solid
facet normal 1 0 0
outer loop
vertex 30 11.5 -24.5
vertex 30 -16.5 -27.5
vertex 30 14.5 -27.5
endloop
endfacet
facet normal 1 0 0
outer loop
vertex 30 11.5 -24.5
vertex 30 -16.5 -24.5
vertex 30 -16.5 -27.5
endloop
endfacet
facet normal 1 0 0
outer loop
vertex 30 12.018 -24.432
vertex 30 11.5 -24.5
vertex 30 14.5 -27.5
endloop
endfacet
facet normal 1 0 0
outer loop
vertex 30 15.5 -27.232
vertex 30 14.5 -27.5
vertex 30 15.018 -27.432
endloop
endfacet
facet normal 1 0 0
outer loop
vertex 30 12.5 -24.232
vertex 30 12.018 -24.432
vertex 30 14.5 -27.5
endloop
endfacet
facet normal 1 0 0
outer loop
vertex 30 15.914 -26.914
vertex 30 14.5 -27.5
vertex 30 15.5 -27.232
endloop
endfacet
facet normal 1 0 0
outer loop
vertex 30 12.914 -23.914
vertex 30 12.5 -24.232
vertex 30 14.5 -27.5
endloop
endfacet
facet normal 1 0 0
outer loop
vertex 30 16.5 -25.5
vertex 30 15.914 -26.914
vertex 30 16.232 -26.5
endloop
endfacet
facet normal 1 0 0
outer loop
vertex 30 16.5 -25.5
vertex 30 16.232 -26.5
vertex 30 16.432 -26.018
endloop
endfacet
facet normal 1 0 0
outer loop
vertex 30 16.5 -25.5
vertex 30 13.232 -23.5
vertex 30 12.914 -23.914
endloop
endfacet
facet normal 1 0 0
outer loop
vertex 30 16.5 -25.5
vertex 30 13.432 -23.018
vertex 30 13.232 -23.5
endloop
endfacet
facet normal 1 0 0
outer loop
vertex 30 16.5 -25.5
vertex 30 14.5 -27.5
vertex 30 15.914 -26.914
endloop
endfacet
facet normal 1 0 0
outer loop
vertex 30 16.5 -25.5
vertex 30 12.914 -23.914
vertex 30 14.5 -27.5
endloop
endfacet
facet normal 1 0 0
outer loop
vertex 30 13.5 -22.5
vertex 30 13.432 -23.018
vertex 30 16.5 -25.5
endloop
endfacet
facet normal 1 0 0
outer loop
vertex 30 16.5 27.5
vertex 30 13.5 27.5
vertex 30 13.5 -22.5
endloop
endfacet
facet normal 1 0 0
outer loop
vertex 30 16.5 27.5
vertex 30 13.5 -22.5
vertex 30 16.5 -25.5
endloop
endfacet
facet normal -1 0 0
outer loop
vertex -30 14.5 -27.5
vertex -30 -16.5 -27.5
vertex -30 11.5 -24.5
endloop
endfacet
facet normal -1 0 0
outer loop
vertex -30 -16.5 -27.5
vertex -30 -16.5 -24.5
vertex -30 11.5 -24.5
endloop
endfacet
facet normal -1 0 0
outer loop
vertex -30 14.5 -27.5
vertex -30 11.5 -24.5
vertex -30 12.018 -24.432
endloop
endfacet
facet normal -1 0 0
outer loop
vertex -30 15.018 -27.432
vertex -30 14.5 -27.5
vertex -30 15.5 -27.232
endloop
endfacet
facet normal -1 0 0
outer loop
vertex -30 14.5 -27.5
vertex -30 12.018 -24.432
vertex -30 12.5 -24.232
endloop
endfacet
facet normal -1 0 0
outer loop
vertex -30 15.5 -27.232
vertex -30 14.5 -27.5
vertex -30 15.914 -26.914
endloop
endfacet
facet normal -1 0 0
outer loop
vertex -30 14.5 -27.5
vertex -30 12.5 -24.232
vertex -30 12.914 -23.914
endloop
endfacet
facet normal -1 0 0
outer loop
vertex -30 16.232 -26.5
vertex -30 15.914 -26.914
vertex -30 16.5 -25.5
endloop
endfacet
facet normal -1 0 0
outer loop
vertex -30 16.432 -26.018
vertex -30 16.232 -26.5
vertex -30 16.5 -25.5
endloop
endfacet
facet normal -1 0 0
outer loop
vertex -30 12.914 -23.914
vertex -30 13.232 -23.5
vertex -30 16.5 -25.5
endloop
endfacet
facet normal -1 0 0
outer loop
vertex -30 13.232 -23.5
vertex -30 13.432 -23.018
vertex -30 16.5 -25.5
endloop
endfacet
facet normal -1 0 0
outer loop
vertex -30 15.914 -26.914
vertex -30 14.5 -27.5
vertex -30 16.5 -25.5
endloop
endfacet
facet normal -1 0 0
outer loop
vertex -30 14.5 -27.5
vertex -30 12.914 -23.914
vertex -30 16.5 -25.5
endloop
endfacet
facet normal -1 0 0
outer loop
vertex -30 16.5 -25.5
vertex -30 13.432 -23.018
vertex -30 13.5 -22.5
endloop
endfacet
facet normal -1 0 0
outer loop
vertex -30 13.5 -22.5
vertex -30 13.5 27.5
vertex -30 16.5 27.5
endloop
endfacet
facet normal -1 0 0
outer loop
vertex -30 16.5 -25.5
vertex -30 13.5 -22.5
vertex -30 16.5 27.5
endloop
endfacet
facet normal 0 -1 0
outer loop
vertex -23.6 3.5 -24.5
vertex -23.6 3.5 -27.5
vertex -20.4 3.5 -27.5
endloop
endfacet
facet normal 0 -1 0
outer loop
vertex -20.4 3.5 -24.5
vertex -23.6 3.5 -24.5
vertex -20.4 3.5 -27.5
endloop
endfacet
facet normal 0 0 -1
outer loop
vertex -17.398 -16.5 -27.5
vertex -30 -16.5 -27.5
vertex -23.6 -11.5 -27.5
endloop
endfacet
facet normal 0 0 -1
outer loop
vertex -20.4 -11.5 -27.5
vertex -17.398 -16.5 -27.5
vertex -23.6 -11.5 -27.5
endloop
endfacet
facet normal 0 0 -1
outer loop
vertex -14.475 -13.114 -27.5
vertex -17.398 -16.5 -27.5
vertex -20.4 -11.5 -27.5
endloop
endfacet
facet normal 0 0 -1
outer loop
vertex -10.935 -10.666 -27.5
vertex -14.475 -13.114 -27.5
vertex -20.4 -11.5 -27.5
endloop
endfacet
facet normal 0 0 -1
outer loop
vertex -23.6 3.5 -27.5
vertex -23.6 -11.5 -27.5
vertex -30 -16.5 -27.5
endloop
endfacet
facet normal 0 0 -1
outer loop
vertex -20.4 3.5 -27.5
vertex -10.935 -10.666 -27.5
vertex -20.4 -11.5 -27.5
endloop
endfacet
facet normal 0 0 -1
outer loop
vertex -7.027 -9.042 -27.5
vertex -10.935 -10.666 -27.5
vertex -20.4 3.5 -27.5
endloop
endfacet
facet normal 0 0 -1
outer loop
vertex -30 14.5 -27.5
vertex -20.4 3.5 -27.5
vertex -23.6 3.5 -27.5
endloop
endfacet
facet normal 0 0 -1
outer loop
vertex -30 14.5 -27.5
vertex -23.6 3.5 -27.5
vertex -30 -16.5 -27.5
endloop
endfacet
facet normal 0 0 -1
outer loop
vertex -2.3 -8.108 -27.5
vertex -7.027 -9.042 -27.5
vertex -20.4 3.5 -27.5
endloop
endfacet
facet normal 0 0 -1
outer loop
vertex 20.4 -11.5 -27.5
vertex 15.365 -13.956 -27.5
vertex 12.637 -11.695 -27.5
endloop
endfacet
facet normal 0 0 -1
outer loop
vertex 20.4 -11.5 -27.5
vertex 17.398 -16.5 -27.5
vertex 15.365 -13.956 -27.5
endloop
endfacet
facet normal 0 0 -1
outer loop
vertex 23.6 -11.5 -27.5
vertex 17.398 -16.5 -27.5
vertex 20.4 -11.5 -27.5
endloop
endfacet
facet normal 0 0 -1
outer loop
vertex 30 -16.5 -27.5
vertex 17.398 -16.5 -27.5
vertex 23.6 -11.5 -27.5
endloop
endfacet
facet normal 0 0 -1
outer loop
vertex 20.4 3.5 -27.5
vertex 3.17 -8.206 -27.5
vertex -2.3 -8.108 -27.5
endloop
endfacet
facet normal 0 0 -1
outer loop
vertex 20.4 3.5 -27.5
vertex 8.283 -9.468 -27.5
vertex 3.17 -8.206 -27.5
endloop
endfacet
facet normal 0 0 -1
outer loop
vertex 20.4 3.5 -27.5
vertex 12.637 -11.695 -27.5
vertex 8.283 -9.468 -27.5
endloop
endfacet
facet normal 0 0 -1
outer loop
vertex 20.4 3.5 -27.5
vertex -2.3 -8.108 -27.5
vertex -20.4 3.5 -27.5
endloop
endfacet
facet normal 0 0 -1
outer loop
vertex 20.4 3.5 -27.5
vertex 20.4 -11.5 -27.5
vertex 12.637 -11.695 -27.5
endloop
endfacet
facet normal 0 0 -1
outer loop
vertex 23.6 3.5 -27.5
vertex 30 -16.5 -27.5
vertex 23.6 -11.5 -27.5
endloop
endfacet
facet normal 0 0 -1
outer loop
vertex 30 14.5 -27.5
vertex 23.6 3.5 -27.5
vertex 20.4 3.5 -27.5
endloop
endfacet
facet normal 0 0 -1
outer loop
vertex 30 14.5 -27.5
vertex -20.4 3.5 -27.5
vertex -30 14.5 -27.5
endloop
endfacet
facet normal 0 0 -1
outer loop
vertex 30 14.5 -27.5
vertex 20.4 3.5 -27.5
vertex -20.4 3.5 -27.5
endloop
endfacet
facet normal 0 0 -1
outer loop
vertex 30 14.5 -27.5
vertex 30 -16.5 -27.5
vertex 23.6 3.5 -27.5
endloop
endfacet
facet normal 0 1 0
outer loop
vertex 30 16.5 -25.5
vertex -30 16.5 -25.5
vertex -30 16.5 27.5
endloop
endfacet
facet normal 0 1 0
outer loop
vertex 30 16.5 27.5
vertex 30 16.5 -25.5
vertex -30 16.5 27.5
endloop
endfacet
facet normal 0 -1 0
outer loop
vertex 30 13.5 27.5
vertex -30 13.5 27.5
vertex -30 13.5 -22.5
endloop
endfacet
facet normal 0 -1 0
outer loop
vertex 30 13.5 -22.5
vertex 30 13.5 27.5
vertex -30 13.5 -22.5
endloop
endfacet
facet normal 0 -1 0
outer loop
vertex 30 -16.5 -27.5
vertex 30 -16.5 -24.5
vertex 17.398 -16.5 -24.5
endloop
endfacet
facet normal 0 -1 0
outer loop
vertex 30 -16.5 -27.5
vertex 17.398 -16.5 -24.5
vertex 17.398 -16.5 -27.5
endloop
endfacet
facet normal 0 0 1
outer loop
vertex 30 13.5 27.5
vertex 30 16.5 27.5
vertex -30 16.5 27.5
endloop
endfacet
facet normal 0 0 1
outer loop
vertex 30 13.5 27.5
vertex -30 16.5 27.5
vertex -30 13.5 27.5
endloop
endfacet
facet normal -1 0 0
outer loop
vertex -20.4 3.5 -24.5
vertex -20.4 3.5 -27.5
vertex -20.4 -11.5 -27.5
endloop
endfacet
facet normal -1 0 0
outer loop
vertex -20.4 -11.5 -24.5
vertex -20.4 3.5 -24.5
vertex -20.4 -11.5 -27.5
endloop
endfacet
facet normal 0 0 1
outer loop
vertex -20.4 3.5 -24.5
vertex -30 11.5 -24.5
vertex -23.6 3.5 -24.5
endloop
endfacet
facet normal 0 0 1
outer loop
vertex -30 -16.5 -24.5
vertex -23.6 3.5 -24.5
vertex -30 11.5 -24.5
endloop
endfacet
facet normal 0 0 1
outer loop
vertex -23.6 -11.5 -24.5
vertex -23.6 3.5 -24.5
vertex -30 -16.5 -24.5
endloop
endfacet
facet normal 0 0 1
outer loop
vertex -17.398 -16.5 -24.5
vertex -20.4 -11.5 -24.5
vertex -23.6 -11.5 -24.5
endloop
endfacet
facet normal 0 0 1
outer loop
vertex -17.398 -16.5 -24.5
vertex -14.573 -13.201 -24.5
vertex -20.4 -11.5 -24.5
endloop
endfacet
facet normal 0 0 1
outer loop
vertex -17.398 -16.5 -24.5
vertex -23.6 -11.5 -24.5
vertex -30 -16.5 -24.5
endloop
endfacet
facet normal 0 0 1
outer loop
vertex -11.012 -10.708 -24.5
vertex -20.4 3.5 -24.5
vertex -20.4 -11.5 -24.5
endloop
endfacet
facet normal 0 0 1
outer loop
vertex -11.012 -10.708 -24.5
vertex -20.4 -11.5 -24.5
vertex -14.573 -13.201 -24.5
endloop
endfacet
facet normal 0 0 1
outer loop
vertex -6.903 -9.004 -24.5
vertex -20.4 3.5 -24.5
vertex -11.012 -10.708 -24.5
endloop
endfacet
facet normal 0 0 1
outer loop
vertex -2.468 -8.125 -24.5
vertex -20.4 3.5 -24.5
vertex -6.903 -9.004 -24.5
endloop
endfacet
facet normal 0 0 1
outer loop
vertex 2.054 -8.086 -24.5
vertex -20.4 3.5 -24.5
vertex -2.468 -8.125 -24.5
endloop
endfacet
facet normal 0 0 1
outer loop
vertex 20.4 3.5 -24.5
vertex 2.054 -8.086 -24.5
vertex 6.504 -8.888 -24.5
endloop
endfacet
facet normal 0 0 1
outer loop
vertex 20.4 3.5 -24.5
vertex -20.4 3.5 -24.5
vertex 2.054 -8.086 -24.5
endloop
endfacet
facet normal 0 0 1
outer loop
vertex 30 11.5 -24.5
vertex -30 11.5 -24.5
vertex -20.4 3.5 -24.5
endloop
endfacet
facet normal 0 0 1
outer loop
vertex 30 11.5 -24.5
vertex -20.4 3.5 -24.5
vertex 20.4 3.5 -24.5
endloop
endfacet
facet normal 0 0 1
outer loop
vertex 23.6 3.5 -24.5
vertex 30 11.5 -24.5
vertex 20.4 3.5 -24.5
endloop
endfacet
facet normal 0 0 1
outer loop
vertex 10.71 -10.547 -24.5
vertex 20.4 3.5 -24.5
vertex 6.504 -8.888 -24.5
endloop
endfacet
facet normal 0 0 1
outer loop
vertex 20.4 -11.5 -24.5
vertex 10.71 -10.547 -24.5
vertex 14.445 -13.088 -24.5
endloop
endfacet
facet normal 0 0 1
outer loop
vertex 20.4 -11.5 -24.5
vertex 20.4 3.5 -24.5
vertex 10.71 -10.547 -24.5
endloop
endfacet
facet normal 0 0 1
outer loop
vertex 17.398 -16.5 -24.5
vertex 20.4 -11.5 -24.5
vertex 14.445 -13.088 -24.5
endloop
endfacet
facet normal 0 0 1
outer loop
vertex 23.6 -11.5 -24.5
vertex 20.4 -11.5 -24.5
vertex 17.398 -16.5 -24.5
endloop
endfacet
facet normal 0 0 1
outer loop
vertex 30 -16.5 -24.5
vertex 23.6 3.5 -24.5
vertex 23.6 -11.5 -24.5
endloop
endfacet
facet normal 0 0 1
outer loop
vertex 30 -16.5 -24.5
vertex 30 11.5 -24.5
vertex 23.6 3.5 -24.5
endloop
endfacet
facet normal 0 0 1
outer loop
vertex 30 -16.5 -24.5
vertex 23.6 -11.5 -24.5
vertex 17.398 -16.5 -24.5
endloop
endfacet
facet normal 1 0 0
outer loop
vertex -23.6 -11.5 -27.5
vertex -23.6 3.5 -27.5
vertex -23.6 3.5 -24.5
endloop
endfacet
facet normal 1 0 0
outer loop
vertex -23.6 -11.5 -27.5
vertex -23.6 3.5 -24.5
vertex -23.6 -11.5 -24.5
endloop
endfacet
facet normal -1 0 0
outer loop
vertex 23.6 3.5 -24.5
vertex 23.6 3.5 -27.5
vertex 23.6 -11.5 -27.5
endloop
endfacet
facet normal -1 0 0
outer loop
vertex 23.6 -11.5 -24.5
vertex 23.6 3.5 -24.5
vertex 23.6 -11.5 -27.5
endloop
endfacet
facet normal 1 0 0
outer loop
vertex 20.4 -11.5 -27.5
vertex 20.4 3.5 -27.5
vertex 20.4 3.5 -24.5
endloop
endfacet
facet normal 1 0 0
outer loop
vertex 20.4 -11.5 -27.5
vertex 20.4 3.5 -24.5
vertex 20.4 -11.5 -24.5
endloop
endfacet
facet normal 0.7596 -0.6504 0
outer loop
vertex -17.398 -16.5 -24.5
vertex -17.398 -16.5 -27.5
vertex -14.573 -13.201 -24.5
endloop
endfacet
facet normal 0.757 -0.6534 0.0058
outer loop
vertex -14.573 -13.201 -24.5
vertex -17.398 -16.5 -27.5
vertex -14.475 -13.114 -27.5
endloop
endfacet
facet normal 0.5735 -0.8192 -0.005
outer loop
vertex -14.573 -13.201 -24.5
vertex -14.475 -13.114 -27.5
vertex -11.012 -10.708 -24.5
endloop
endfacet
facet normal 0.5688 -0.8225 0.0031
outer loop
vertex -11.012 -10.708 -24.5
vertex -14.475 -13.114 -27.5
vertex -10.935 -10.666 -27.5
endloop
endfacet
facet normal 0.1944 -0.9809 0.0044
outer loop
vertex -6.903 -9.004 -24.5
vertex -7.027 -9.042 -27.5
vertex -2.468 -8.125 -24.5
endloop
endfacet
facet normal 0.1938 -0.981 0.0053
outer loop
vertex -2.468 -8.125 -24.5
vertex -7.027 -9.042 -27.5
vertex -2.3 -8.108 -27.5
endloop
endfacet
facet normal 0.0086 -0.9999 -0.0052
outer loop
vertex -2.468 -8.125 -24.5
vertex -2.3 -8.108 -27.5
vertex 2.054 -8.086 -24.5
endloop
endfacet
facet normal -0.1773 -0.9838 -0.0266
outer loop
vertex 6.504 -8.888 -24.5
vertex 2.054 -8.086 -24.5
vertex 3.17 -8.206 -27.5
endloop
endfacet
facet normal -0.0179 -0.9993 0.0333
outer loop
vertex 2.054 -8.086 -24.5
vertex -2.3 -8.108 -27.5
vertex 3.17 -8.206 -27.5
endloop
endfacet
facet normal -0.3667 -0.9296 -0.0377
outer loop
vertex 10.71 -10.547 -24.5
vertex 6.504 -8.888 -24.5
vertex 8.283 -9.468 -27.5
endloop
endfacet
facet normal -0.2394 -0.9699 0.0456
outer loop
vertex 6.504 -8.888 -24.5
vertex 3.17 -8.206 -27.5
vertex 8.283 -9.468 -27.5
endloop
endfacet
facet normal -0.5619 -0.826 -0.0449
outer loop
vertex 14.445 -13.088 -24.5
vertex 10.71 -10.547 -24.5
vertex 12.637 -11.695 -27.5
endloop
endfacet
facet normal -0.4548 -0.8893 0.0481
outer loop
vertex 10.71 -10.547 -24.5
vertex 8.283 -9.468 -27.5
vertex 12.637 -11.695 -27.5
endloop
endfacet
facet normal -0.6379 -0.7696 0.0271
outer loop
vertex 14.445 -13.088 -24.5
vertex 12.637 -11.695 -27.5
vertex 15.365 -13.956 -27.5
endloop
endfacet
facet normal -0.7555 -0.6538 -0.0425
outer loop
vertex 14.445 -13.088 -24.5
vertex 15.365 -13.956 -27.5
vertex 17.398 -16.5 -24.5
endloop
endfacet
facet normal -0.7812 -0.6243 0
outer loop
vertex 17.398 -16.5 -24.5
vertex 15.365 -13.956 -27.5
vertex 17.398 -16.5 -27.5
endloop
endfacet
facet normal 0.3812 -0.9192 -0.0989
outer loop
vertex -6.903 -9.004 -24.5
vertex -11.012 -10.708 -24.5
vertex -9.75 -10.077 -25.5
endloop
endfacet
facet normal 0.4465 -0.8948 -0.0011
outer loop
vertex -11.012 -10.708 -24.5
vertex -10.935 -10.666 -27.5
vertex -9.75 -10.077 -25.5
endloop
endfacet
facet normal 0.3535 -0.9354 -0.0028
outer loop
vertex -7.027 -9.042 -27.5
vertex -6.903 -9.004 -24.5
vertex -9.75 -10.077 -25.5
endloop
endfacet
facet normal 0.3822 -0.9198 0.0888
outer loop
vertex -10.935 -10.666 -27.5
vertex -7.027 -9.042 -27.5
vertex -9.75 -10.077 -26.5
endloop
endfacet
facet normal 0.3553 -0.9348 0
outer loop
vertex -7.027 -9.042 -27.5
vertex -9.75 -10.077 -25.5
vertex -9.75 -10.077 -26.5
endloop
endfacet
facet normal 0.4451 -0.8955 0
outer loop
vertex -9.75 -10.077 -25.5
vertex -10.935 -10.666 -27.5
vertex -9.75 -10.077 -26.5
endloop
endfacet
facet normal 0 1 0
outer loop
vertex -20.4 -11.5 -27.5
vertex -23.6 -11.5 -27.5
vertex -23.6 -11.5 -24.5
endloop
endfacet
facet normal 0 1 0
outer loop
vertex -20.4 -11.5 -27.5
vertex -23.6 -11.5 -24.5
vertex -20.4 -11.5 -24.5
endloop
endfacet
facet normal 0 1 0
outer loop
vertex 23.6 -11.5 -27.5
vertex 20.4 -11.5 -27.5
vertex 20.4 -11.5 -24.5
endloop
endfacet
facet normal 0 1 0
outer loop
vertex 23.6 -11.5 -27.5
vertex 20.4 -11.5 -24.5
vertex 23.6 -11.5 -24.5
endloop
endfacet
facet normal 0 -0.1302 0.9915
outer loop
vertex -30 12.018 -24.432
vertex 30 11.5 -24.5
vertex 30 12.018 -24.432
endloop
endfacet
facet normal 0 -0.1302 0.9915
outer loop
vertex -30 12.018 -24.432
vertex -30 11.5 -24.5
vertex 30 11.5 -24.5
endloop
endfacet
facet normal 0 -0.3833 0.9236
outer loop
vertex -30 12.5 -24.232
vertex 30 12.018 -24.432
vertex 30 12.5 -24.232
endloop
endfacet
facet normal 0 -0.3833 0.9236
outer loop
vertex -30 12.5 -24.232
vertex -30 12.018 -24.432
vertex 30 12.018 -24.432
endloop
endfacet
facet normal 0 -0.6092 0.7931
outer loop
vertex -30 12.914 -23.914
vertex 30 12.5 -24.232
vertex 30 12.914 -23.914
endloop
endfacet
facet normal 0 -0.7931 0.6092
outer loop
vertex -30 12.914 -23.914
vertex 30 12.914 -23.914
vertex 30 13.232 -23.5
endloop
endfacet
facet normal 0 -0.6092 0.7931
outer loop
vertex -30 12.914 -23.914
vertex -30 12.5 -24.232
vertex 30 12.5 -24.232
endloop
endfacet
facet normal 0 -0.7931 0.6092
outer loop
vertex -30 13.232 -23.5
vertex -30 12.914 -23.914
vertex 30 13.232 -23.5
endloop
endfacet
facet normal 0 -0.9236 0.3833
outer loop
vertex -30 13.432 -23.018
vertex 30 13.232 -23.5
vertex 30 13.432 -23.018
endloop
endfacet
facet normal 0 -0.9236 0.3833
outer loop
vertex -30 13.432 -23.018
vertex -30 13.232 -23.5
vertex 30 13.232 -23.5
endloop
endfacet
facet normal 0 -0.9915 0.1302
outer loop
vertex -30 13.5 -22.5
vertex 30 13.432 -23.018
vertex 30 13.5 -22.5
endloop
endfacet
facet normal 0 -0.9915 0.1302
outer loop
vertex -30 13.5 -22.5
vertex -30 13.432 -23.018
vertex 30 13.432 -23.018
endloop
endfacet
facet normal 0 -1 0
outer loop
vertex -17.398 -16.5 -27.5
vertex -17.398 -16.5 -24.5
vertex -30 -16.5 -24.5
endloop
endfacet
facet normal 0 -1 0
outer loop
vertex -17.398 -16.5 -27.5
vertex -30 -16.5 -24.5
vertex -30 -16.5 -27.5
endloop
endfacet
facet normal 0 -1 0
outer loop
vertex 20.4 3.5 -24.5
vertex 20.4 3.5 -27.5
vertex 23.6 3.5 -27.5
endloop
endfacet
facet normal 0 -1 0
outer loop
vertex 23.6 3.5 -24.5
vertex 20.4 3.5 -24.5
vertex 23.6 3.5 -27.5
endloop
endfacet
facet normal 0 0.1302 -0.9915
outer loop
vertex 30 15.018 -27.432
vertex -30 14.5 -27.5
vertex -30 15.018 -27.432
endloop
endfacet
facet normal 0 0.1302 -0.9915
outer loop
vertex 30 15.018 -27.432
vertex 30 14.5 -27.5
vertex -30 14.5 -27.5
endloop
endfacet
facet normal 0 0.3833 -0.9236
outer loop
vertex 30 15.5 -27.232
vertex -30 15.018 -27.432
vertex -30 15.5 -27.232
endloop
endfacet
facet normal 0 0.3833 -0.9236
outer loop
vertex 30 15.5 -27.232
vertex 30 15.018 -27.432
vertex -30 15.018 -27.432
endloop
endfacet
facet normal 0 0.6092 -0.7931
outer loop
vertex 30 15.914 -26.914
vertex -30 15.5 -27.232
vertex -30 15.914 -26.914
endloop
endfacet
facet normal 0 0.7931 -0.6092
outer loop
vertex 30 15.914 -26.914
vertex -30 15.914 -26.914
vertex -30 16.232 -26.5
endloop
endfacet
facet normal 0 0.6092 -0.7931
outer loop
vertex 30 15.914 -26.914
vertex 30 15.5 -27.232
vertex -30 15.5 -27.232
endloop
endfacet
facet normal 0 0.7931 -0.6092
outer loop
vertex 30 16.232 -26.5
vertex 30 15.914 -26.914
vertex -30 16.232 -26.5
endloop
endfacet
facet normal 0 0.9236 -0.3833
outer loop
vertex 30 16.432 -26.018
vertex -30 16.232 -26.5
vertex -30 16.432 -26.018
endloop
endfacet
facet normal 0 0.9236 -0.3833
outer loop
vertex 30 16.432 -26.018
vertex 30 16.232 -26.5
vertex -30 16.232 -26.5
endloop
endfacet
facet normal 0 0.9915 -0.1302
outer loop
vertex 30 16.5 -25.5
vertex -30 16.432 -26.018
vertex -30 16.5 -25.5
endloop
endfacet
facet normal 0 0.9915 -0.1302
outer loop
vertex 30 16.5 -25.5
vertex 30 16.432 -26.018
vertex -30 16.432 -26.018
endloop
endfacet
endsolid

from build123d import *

# Parameters (mm, degrees)
F1_DEPTH = 30
F2_W     = 3.2
F2_H     = 15
F3_DEPTH = 25
F5_DEPTH = 25
F6_R     = 2


with BuildPart() as f1:
    # F0 (on Right) → F1 (new body, symmetric)
    with BuildSketch(Plane.YZ):
        Polygon((-16.5, -24.5), (-16.5, -27.5), (16.5, -27.5), (16.5, 27.5), (13.5, 27.5), (13.5, -24.5), align=None)
    extrude(amount=F1_DEPTH, both=True)

    # F2 (on face) → F3 (cut)
    with BuildSketch(Plane(origin=(0, 0, -27.5), x_dir=(1, 0, 0), z_dir=(0, 0, -1))):
        with Locations((22, 4)):
            Rectangle(F2_W, F2_H)
        with Locations((-22, 4)):
            Rectangle(F2_W, F2_H)
    extrude(amount=-F3_DEPTH, mode=Mode.SUBTRACT)

    # F4 (on face) → F5 (cut)
    with BuildSketch(Plane(origin=(0, 0, -27.5), x_dir=(1, 0, 0), z_dir=(0, 0, -1))):
        with BuildLine():
            add(Edge.make_bspline(
                [(19.5, 23.5), (19.5, 50.3467875173), (-9.75, 36.9233937587), (-39, 23.5), (-9.75, 10.0766062413), (19.5, -3.3467875173), (19.5, 23.5)],
                knots=[0, 0, 0, 2.0943951024, 2.0943951024, 4.1887902048, 4.1887902048, 6.2831853072, 6.2831853072, 6.2831853072], degree=2, weights=[1, 0.5, 1, 0.5, 1, 0.5, 1]))
        make_face()
    extrude(amount=-F5_DEPTH, mode=Mode.SUBTRACT)

    # F6
    f6_edges = [f1.edges().sort_by_distance(p)[0] for p in [
        (0, 13.5, -24.5),
        (0, 16.5, -27.5),
    ]]
    fillet(f6_edges, radius=F6_R)


solid = f1.part
